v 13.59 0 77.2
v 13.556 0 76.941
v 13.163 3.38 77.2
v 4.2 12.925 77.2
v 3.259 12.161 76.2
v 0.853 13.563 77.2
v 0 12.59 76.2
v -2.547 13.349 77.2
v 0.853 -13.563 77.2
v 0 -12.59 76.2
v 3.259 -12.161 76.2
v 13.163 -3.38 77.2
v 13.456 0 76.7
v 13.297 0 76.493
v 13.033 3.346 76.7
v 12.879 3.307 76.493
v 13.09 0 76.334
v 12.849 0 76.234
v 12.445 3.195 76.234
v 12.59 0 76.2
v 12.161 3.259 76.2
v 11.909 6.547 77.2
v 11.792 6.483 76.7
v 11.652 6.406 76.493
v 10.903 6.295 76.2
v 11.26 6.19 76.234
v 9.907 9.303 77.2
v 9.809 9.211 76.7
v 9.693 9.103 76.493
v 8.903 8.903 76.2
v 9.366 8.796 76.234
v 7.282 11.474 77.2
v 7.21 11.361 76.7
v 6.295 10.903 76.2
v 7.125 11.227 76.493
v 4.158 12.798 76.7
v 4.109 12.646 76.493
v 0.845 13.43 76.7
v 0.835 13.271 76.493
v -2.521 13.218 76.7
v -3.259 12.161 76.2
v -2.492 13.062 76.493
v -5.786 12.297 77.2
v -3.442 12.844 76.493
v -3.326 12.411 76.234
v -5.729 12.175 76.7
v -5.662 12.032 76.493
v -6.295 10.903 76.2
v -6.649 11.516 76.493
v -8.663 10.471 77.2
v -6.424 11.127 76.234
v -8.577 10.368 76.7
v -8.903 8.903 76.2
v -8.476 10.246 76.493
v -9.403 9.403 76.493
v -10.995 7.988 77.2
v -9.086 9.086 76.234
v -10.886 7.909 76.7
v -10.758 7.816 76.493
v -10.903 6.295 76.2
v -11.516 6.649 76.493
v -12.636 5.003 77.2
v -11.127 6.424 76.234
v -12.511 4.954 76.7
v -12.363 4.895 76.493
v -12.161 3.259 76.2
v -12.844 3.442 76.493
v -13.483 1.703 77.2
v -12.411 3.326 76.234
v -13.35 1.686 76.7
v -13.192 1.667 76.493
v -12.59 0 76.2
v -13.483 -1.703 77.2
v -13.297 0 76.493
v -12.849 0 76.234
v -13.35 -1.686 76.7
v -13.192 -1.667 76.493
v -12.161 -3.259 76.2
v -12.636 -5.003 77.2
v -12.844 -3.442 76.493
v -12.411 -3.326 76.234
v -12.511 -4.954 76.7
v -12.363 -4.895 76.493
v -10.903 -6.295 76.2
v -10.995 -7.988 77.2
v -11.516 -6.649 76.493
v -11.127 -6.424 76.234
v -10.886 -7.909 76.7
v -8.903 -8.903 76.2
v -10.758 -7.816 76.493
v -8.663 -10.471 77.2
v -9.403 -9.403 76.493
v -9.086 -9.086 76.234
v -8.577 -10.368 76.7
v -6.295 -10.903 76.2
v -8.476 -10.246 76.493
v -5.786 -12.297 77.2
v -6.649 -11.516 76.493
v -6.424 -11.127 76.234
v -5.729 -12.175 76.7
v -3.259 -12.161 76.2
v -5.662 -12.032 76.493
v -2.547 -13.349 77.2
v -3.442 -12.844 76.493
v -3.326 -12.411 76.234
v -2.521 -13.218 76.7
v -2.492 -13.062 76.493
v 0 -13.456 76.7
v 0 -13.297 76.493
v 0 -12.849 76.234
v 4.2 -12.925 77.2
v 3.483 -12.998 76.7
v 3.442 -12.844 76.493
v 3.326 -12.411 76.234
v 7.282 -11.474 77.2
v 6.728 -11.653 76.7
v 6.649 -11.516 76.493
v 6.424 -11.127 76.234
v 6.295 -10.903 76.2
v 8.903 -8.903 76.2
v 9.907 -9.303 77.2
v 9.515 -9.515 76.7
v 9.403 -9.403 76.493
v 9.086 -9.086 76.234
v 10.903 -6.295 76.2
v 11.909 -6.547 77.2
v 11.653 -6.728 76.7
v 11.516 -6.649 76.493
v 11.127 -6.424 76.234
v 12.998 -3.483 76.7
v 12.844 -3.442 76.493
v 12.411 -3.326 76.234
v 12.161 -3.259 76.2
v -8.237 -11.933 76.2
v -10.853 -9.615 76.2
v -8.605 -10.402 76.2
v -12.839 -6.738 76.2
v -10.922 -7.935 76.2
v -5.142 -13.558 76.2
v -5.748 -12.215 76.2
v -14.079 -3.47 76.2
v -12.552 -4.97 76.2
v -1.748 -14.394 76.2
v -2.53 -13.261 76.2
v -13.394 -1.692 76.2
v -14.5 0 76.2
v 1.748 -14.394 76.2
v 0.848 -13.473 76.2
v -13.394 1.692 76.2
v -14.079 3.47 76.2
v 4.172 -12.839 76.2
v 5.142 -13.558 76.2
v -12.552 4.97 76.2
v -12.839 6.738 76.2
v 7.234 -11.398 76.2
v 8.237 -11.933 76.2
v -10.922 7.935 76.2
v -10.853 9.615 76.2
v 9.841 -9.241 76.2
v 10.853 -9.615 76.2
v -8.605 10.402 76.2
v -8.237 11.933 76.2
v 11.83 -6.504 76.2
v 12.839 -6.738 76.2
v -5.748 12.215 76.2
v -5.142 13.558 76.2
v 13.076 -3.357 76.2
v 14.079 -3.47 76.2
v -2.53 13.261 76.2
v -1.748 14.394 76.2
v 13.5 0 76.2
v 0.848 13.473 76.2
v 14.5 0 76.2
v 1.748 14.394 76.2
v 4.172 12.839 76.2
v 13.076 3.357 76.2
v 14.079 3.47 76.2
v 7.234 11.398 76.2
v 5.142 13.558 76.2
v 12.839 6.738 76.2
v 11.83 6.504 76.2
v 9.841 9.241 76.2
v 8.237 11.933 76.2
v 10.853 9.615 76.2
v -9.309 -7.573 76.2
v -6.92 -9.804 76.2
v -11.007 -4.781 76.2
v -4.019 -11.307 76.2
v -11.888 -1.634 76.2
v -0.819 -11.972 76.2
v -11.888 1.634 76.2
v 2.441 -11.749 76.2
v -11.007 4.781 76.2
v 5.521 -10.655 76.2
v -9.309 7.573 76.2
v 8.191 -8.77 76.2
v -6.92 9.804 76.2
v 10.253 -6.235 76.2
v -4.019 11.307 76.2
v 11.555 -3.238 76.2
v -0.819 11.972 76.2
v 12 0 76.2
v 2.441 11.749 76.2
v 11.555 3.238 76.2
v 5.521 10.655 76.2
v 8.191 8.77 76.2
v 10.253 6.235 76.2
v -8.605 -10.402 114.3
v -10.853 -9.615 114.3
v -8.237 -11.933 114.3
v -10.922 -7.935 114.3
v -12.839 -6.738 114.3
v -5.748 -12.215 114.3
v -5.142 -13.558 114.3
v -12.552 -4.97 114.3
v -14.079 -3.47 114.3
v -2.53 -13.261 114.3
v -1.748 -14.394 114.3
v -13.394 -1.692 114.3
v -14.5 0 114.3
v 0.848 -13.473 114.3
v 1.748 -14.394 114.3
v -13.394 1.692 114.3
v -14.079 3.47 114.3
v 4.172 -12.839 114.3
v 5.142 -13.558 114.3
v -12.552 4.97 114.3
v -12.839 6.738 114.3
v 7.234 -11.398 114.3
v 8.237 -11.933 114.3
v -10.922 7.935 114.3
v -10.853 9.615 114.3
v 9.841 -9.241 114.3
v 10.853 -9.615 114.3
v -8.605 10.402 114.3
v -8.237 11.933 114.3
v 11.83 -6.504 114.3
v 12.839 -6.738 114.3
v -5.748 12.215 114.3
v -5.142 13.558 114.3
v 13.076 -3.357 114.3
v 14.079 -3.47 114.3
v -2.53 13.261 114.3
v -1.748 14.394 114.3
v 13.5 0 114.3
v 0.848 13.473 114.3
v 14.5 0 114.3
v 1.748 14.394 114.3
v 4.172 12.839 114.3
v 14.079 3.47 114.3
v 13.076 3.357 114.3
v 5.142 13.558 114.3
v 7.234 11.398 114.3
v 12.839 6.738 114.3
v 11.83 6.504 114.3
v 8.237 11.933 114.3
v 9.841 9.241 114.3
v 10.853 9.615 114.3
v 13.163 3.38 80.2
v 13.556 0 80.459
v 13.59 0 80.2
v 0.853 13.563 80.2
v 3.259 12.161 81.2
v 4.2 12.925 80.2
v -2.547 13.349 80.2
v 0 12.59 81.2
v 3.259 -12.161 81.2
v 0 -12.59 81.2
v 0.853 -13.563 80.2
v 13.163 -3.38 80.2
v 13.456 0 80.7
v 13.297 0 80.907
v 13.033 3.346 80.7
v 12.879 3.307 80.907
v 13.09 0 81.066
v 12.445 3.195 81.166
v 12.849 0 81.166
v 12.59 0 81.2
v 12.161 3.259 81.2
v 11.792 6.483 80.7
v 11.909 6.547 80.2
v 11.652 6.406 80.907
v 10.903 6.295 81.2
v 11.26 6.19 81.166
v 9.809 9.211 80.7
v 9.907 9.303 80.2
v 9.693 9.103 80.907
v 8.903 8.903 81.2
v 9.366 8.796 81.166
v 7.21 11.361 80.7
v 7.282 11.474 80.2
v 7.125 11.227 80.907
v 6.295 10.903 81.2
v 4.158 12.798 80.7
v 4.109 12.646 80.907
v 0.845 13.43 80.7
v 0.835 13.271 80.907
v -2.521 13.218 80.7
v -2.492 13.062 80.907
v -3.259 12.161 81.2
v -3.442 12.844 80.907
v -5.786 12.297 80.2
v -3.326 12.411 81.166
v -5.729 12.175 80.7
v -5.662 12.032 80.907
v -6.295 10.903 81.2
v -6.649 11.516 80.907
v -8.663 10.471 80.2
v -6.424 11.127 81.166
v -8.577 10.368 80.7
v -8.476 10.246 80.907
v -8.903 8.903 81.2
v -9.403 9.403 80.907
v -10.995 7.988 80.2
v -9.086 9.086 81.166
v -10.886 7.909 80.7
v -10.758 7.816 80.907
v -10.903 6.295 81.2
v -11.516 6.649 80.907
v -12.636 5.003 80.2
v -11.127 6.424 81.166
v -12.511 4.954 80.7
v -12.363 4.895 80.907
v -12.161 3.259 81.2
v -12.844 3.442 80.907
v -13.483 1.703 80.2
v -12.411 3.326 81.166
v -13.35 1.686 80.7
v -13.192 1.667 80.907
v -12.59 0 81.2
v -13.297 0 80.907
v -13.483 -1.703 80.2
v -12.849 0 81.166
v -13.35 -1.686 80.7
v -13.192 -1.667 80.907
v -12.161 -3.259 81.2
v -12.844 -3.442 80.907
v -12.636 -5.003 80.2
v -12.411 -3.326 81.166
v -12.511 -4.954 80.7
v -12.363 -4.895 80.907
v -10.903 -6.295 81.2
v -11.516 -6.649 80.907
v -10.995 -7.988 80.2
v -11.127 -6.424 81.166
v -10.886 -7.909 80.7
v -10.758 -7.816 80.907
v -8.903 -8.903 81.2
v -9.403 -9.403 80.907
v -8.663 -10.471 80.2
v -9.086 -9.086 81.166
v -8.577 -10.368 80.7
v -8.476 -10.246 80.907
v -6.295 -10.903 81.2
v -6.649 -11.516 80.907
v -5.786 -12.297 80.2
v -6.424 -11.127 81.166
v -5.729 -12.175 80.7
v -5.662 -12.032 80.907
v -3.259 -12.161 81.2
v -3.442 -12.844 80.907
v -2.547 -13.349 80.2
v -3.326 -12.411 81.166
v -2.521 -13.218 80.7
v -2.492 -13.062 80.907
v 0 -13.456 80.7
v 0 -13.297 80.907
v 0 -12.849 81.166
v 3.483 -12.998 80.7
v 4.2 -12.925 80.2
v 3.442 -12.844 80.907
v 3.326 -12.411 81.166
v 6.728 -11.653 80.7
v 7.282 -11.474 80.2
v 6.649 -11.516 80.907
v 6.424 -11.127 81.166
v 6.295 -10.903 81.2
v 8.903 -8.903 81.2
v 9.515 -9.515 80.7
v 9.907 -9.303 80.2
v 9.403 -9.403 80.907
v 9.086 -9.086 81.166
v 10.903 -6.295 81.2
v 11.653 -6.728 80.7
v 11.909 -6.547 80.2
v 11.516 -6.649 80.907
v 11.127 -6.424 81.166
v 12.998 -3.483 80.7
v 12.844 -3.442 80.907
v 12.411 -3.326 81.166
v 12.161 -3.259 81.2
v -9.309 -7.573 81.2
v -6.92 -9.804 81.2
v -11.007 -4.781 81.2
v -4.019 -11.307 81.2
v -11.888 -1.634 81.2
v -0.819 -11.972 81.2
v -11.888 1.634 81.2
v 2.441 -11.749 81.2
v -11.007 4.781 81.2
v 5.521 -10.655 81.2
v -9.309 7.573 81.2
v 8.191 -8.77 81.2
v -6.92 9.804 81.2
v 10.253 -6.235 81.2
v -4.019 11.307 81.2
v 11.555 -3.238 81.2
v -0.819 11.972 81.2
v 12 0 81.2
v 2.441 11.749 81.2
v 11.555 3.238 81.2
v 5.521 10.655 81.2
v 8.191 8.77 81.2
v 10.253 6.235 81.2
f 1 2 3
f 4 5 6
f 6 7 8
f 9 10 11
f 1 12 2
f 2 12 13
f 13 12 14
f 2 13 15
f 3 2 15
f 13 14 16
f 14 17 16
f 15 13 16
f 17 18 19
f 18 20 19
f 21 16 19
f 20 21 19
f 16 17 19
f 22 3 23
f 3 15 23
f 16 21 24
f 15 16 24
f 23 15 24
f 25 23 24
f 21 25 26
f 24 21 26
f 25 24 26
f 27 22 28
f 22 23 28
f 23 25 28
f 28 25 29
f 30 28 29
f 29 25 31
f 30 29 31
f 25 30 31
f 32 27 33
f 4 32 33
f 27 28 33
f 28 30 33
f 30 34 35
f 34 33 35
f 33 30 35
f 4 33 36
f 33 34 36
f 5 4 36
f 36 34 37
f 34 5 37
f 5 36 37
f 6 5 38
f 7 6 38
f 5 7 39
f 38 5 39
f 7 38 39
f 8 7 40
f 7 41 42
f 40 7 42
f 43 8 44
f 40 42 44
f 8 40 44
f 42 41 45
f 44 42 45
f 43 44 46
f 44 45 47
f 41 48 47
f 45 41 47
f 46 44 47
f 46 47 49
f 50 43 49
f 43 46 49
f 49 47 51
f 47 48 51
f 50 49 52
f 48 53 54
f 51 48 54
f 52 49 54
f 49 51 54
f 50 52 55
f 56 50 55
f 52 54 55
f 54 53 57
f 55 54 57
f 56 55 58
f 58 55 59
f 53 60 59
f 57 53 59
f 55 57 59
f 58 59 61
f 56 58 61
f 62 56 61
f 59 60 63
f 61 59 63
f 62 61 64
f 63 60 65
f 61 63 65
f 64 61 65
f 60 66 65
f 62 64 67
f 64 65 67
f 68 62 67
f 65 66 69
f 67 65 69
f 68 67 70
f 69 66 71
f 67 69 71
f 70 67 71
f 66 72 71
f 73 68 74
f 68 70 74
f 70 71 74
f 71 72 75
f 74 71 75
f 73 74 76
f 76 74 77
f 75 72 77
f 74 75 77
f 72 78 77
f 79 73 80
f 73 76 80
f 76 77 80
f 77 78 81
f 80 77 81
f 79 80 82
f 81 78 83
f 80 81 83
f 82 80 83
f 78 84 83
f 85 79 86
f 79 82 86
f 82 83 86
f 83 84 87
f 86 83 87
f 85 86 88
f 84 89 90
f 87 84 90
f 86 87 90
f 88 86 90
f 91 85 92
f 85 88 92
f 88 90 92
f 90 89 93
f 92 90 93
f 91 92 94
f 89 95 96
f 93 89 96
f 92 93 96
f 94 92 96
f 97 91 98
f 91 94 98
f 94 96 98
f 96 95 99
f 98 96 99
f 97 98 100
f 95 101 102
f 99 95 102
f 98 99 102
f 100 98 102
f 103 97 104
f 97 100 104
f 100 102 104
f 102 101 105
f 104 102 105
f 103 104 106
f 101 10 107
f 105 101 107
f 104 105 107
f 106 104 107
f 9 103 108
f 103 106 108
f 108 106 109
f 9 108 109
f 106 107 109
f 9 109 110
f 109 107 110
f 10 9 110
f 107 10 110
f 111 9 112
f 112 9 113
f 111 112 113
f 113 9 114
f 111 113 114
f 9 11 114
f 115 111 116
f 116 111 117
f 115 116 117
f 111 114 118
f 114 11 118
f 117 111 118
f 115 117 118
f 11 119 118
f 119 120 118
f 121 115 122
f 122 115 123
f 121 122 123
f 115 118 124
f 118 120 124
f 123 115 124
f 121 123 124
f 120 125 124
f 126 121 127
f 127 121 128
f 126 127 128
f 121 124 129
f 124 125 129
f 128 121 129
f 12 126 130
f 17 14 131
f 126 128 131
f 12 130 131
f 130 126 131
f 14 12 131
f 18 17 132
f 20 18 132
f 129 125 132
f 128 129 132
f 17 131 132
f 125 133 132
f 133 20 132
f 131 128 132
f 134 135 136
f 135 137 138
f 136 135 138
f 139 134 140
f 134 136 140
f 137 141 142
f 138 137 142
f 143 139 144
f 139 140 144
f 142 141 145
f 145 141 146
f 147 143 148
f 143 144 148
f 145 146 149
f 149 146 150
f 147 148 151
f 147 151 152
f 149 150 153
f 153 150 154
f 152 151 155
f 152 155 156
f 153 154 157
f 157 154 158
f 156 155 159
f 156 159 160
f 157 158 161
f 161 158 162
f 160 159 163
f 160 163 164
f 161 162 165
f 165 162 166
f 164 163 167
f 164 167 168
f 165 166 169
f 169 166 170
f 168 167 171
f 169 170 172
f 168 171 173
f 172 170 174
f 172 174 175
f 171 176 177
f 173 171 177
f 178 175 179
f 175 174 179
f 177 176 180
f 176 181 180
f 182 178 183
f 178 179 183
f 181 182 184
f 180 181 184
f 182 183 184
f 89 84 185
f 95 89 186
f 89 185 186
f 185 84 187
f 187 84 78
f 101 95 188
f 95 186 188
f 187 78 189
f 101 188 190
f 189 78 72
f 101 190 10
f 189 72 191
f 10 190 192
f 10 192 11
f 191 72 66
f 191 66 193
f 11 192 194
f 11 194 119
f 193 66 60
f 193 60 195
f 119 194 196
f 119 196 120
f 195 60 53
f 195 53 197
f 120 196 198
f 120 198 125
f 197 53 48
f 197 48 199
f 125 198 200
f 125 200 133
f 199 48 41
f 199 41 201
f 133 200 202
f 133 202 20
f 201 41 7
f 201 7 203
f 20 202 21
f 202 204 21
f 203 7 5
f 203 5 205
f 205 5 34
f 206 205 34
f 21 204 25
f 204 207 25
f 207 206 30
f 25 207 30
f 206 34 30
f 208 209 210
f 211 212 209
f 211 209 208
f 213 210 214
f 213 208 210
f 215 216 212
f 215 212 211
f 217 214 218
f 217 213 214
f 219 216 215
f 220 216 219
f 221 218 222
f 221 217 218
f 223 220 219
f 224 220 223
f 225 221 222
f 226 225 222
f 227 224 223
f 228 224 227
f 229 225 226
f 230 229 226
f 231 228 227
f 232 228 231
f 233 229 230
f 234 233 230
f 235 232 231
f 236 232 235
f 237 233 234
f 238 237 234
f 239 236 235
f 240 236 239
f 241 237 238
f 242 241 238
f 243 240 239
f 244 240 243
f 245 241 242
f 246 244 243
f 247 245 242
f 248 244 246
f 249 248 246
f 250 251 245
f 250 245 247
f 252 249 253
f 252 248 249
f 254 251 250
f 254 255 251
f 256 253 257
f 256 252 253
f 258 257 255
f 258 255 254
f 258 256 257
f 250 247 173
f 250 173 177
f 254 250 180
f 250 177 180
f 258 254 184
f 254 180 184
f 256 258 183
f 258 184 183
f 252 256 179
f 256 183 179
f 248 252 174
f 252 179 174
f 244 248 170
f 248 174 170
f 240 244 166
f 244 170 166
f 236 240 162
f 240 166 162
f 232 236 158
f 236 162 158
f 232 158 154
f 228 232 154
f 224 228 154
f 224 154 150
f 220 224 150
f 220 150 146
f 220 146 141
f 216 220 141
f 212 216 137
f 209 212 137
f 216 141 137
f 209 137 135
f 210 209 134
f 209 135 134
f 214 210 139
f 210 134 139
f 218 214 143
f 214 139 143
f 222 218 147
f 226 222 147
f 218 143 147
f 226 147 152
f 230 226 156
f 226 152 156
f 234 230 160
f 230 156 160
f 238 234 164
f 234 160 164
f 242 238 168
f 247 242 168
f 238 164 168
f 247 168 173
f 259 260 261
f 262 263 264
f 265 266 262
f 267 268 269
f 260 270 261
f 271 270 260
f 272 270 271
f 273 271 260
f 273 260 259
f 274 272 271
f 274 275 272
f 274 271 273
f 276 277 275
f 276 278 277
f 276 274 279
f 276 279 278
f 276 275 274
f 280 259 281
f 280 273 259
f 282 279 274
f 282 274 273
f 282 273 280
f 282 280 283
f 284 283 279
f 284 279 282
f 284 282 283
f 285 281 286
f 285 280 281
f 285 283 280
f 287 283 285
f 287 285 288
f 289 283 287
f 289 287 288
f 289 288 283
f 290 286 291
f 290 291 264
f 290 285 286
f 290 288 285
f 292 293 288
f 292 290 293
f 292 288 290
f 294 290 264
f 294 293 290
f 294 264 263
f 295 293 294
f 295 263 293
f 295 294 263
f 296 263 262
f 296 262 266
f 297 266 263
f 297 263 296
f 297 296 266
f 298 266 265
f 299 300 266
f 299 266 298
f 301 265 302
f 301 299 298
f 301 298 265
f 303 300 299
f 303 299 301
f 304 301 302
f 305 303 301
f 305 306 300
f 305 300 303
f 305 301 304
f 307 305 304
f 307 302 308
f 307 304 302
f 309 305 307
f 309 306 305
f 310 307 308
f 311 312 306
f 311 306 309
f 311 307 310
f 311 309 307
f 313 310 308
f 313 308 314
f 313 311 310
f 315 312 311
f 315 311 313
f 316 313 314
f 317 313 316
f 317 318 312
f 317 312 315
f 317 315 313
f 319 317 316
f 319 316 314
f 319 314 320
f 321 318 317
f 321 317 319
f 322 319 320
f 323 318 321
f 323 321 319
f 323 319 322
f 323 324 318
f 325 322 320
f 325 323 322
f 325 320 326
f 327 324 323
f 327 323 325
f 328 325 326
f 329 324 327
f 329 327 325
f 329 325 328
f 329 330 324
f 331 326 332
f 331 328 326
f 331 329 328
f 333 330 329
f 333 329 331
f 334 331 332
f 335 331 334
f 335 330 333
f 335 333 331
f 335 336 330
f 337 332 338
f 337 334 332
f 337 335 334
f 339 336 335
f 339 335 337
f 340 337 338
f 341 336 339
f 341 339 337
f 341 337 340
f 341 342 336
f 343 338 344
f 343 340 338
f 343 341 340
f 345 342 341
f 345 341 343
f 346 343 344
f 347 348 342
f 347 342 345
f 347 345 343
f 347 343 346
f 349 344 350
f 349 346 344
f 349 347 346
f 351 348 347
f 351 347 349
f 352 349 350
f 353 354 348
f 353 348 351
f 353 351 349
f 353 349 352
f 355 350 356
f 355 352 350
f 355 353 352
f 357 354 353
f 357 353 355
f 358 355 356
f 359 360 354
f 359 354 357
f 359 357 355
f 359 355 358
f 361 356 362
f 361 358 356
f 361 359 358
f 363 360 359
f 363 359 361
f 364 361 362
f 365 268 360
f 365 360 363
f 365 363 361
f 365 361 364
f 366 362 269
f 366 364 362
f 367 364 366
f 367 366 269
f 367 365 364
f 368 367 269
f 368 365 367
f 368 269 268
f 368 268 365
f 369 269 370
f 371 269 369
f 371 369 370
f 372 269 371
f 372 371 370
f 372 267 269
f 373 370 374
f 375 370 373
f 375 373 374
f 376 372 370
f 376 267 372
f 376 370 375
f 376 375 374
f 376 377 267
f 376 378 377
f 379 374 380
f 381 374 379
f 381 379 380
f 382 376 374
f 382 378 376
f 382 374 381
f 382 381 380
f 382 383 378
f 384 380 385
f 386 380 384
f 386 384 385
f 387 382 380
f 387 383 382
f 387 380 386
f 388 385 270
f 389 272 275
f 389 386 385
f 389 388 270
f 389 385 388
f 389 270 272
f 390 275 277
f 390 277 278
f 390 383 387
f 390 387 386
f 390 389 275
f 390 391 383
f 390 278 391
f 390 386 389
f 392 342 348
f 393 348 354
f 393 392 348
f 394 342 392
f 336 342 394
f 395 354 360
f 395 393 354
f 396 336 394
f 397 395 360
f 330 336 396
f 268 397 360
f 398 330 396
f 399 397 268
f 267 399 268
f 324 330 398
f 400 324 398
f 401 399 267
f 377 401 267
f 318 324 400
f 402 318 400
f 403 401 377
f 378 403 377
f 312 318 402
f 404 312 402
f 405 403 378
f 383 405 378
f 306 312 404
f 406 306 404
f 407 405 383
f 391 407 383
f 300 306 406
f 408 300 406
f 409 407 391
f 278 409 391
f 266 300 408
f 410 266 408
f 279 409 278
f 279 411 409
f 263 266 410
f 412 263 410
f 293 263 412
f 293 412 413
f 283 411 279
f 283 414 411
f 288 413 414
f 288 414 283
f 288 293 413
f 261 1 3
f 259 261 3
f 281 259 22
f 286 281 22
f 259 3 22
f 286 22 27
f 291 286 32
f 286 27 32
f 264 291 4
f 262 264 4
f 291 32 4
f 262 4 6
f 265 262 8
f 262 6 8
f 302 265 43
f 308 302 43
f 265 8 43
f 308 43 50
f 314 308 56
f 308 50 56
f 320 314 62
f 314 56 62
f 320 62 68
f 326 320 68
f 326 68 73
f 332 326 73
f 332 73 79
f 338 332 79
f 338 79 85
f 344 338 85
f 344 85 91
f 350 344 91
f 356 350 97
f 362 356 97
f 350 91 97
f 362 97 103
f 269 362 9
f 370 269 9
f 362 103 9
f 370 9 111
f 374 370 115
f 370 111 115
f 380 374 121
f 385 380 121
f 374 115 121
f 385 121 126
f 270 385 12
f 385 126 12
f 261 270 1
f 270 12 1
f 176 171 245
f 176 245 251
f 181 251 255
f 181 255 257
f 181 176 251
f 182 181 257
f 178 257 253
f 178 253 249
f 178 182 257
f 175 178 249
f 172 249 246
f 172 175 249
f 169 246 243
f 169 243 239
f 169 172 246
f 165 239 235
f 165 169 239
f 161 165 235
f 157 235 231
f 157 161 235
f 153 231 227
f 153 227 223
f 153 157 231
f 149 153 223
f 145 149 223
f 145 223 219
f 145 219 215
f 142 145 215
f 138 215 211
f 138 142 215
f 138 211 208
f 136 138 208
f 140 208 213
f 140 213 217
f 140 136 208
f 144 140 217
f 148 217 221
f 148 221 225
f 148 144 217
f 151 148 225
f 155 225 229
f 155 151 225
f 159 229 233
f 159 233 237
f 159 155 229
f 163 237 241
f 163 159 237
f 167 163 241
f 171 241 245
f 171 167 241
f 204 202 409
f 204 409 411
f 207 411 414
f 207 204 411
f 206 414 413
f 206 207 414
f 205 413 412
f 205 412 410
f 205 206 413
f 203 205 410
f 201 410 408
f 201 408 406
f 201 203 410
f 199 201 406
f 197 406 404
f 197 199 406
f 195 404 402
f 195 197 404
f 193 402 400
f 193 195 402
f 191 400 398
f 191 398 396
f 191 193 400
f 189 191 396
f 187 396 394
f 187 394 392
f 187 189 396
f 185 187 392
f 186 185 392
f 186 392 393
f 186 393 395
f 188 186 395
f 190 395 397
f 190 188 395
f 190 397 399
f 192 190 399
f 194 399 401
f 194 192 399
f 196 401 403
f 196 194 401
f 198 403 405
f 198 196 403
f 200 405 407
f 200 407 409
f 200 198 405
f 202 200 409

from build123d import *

# Parameters (mm, degrees)
F2_R      = 14.5
F2_R_2    = 13.5
F8_DEPTH  = 38.1
F10_R     = 13.5900846428
F10_R_2   = 12
F11_DEPTH = 5
F12_R     = 1


# Not quite as in the source:
# - the program builds the solid bodies; features that only make, move or delete a surface that nothing else refers to are left out


with BuildPart() as f8:
    # F2 (on offset) → F8 (new body)
    with BuildSketch(Plane.XY.offset(76.2)):
        Circle(F2_R)
        Circle(F2_R_2, mode=Mode.SUBTRACT)
    extrude(amount=F8_DEPTH)


with BuildPart() as f11:
    # F10 (on offset) → F11 (new body)
    with BuildSketch(Plane.XY.offset(76.2)):
        Circle(F10_R)
        Circle(F10_R_2, mode=Mode.SUBTRACT)
    extrude(amount=F11_DEPTH)

    # F12
    f12_edges = [f11.edges().sort_by_distance(p)[0] for p in [
        (-13.590085, 0, 76.2),
        (-13.590085, 0, 81.2),
    ]]
    fillet(f12_edges, radius=F12_R)


solid = Compound([f8.part, f11.part])
